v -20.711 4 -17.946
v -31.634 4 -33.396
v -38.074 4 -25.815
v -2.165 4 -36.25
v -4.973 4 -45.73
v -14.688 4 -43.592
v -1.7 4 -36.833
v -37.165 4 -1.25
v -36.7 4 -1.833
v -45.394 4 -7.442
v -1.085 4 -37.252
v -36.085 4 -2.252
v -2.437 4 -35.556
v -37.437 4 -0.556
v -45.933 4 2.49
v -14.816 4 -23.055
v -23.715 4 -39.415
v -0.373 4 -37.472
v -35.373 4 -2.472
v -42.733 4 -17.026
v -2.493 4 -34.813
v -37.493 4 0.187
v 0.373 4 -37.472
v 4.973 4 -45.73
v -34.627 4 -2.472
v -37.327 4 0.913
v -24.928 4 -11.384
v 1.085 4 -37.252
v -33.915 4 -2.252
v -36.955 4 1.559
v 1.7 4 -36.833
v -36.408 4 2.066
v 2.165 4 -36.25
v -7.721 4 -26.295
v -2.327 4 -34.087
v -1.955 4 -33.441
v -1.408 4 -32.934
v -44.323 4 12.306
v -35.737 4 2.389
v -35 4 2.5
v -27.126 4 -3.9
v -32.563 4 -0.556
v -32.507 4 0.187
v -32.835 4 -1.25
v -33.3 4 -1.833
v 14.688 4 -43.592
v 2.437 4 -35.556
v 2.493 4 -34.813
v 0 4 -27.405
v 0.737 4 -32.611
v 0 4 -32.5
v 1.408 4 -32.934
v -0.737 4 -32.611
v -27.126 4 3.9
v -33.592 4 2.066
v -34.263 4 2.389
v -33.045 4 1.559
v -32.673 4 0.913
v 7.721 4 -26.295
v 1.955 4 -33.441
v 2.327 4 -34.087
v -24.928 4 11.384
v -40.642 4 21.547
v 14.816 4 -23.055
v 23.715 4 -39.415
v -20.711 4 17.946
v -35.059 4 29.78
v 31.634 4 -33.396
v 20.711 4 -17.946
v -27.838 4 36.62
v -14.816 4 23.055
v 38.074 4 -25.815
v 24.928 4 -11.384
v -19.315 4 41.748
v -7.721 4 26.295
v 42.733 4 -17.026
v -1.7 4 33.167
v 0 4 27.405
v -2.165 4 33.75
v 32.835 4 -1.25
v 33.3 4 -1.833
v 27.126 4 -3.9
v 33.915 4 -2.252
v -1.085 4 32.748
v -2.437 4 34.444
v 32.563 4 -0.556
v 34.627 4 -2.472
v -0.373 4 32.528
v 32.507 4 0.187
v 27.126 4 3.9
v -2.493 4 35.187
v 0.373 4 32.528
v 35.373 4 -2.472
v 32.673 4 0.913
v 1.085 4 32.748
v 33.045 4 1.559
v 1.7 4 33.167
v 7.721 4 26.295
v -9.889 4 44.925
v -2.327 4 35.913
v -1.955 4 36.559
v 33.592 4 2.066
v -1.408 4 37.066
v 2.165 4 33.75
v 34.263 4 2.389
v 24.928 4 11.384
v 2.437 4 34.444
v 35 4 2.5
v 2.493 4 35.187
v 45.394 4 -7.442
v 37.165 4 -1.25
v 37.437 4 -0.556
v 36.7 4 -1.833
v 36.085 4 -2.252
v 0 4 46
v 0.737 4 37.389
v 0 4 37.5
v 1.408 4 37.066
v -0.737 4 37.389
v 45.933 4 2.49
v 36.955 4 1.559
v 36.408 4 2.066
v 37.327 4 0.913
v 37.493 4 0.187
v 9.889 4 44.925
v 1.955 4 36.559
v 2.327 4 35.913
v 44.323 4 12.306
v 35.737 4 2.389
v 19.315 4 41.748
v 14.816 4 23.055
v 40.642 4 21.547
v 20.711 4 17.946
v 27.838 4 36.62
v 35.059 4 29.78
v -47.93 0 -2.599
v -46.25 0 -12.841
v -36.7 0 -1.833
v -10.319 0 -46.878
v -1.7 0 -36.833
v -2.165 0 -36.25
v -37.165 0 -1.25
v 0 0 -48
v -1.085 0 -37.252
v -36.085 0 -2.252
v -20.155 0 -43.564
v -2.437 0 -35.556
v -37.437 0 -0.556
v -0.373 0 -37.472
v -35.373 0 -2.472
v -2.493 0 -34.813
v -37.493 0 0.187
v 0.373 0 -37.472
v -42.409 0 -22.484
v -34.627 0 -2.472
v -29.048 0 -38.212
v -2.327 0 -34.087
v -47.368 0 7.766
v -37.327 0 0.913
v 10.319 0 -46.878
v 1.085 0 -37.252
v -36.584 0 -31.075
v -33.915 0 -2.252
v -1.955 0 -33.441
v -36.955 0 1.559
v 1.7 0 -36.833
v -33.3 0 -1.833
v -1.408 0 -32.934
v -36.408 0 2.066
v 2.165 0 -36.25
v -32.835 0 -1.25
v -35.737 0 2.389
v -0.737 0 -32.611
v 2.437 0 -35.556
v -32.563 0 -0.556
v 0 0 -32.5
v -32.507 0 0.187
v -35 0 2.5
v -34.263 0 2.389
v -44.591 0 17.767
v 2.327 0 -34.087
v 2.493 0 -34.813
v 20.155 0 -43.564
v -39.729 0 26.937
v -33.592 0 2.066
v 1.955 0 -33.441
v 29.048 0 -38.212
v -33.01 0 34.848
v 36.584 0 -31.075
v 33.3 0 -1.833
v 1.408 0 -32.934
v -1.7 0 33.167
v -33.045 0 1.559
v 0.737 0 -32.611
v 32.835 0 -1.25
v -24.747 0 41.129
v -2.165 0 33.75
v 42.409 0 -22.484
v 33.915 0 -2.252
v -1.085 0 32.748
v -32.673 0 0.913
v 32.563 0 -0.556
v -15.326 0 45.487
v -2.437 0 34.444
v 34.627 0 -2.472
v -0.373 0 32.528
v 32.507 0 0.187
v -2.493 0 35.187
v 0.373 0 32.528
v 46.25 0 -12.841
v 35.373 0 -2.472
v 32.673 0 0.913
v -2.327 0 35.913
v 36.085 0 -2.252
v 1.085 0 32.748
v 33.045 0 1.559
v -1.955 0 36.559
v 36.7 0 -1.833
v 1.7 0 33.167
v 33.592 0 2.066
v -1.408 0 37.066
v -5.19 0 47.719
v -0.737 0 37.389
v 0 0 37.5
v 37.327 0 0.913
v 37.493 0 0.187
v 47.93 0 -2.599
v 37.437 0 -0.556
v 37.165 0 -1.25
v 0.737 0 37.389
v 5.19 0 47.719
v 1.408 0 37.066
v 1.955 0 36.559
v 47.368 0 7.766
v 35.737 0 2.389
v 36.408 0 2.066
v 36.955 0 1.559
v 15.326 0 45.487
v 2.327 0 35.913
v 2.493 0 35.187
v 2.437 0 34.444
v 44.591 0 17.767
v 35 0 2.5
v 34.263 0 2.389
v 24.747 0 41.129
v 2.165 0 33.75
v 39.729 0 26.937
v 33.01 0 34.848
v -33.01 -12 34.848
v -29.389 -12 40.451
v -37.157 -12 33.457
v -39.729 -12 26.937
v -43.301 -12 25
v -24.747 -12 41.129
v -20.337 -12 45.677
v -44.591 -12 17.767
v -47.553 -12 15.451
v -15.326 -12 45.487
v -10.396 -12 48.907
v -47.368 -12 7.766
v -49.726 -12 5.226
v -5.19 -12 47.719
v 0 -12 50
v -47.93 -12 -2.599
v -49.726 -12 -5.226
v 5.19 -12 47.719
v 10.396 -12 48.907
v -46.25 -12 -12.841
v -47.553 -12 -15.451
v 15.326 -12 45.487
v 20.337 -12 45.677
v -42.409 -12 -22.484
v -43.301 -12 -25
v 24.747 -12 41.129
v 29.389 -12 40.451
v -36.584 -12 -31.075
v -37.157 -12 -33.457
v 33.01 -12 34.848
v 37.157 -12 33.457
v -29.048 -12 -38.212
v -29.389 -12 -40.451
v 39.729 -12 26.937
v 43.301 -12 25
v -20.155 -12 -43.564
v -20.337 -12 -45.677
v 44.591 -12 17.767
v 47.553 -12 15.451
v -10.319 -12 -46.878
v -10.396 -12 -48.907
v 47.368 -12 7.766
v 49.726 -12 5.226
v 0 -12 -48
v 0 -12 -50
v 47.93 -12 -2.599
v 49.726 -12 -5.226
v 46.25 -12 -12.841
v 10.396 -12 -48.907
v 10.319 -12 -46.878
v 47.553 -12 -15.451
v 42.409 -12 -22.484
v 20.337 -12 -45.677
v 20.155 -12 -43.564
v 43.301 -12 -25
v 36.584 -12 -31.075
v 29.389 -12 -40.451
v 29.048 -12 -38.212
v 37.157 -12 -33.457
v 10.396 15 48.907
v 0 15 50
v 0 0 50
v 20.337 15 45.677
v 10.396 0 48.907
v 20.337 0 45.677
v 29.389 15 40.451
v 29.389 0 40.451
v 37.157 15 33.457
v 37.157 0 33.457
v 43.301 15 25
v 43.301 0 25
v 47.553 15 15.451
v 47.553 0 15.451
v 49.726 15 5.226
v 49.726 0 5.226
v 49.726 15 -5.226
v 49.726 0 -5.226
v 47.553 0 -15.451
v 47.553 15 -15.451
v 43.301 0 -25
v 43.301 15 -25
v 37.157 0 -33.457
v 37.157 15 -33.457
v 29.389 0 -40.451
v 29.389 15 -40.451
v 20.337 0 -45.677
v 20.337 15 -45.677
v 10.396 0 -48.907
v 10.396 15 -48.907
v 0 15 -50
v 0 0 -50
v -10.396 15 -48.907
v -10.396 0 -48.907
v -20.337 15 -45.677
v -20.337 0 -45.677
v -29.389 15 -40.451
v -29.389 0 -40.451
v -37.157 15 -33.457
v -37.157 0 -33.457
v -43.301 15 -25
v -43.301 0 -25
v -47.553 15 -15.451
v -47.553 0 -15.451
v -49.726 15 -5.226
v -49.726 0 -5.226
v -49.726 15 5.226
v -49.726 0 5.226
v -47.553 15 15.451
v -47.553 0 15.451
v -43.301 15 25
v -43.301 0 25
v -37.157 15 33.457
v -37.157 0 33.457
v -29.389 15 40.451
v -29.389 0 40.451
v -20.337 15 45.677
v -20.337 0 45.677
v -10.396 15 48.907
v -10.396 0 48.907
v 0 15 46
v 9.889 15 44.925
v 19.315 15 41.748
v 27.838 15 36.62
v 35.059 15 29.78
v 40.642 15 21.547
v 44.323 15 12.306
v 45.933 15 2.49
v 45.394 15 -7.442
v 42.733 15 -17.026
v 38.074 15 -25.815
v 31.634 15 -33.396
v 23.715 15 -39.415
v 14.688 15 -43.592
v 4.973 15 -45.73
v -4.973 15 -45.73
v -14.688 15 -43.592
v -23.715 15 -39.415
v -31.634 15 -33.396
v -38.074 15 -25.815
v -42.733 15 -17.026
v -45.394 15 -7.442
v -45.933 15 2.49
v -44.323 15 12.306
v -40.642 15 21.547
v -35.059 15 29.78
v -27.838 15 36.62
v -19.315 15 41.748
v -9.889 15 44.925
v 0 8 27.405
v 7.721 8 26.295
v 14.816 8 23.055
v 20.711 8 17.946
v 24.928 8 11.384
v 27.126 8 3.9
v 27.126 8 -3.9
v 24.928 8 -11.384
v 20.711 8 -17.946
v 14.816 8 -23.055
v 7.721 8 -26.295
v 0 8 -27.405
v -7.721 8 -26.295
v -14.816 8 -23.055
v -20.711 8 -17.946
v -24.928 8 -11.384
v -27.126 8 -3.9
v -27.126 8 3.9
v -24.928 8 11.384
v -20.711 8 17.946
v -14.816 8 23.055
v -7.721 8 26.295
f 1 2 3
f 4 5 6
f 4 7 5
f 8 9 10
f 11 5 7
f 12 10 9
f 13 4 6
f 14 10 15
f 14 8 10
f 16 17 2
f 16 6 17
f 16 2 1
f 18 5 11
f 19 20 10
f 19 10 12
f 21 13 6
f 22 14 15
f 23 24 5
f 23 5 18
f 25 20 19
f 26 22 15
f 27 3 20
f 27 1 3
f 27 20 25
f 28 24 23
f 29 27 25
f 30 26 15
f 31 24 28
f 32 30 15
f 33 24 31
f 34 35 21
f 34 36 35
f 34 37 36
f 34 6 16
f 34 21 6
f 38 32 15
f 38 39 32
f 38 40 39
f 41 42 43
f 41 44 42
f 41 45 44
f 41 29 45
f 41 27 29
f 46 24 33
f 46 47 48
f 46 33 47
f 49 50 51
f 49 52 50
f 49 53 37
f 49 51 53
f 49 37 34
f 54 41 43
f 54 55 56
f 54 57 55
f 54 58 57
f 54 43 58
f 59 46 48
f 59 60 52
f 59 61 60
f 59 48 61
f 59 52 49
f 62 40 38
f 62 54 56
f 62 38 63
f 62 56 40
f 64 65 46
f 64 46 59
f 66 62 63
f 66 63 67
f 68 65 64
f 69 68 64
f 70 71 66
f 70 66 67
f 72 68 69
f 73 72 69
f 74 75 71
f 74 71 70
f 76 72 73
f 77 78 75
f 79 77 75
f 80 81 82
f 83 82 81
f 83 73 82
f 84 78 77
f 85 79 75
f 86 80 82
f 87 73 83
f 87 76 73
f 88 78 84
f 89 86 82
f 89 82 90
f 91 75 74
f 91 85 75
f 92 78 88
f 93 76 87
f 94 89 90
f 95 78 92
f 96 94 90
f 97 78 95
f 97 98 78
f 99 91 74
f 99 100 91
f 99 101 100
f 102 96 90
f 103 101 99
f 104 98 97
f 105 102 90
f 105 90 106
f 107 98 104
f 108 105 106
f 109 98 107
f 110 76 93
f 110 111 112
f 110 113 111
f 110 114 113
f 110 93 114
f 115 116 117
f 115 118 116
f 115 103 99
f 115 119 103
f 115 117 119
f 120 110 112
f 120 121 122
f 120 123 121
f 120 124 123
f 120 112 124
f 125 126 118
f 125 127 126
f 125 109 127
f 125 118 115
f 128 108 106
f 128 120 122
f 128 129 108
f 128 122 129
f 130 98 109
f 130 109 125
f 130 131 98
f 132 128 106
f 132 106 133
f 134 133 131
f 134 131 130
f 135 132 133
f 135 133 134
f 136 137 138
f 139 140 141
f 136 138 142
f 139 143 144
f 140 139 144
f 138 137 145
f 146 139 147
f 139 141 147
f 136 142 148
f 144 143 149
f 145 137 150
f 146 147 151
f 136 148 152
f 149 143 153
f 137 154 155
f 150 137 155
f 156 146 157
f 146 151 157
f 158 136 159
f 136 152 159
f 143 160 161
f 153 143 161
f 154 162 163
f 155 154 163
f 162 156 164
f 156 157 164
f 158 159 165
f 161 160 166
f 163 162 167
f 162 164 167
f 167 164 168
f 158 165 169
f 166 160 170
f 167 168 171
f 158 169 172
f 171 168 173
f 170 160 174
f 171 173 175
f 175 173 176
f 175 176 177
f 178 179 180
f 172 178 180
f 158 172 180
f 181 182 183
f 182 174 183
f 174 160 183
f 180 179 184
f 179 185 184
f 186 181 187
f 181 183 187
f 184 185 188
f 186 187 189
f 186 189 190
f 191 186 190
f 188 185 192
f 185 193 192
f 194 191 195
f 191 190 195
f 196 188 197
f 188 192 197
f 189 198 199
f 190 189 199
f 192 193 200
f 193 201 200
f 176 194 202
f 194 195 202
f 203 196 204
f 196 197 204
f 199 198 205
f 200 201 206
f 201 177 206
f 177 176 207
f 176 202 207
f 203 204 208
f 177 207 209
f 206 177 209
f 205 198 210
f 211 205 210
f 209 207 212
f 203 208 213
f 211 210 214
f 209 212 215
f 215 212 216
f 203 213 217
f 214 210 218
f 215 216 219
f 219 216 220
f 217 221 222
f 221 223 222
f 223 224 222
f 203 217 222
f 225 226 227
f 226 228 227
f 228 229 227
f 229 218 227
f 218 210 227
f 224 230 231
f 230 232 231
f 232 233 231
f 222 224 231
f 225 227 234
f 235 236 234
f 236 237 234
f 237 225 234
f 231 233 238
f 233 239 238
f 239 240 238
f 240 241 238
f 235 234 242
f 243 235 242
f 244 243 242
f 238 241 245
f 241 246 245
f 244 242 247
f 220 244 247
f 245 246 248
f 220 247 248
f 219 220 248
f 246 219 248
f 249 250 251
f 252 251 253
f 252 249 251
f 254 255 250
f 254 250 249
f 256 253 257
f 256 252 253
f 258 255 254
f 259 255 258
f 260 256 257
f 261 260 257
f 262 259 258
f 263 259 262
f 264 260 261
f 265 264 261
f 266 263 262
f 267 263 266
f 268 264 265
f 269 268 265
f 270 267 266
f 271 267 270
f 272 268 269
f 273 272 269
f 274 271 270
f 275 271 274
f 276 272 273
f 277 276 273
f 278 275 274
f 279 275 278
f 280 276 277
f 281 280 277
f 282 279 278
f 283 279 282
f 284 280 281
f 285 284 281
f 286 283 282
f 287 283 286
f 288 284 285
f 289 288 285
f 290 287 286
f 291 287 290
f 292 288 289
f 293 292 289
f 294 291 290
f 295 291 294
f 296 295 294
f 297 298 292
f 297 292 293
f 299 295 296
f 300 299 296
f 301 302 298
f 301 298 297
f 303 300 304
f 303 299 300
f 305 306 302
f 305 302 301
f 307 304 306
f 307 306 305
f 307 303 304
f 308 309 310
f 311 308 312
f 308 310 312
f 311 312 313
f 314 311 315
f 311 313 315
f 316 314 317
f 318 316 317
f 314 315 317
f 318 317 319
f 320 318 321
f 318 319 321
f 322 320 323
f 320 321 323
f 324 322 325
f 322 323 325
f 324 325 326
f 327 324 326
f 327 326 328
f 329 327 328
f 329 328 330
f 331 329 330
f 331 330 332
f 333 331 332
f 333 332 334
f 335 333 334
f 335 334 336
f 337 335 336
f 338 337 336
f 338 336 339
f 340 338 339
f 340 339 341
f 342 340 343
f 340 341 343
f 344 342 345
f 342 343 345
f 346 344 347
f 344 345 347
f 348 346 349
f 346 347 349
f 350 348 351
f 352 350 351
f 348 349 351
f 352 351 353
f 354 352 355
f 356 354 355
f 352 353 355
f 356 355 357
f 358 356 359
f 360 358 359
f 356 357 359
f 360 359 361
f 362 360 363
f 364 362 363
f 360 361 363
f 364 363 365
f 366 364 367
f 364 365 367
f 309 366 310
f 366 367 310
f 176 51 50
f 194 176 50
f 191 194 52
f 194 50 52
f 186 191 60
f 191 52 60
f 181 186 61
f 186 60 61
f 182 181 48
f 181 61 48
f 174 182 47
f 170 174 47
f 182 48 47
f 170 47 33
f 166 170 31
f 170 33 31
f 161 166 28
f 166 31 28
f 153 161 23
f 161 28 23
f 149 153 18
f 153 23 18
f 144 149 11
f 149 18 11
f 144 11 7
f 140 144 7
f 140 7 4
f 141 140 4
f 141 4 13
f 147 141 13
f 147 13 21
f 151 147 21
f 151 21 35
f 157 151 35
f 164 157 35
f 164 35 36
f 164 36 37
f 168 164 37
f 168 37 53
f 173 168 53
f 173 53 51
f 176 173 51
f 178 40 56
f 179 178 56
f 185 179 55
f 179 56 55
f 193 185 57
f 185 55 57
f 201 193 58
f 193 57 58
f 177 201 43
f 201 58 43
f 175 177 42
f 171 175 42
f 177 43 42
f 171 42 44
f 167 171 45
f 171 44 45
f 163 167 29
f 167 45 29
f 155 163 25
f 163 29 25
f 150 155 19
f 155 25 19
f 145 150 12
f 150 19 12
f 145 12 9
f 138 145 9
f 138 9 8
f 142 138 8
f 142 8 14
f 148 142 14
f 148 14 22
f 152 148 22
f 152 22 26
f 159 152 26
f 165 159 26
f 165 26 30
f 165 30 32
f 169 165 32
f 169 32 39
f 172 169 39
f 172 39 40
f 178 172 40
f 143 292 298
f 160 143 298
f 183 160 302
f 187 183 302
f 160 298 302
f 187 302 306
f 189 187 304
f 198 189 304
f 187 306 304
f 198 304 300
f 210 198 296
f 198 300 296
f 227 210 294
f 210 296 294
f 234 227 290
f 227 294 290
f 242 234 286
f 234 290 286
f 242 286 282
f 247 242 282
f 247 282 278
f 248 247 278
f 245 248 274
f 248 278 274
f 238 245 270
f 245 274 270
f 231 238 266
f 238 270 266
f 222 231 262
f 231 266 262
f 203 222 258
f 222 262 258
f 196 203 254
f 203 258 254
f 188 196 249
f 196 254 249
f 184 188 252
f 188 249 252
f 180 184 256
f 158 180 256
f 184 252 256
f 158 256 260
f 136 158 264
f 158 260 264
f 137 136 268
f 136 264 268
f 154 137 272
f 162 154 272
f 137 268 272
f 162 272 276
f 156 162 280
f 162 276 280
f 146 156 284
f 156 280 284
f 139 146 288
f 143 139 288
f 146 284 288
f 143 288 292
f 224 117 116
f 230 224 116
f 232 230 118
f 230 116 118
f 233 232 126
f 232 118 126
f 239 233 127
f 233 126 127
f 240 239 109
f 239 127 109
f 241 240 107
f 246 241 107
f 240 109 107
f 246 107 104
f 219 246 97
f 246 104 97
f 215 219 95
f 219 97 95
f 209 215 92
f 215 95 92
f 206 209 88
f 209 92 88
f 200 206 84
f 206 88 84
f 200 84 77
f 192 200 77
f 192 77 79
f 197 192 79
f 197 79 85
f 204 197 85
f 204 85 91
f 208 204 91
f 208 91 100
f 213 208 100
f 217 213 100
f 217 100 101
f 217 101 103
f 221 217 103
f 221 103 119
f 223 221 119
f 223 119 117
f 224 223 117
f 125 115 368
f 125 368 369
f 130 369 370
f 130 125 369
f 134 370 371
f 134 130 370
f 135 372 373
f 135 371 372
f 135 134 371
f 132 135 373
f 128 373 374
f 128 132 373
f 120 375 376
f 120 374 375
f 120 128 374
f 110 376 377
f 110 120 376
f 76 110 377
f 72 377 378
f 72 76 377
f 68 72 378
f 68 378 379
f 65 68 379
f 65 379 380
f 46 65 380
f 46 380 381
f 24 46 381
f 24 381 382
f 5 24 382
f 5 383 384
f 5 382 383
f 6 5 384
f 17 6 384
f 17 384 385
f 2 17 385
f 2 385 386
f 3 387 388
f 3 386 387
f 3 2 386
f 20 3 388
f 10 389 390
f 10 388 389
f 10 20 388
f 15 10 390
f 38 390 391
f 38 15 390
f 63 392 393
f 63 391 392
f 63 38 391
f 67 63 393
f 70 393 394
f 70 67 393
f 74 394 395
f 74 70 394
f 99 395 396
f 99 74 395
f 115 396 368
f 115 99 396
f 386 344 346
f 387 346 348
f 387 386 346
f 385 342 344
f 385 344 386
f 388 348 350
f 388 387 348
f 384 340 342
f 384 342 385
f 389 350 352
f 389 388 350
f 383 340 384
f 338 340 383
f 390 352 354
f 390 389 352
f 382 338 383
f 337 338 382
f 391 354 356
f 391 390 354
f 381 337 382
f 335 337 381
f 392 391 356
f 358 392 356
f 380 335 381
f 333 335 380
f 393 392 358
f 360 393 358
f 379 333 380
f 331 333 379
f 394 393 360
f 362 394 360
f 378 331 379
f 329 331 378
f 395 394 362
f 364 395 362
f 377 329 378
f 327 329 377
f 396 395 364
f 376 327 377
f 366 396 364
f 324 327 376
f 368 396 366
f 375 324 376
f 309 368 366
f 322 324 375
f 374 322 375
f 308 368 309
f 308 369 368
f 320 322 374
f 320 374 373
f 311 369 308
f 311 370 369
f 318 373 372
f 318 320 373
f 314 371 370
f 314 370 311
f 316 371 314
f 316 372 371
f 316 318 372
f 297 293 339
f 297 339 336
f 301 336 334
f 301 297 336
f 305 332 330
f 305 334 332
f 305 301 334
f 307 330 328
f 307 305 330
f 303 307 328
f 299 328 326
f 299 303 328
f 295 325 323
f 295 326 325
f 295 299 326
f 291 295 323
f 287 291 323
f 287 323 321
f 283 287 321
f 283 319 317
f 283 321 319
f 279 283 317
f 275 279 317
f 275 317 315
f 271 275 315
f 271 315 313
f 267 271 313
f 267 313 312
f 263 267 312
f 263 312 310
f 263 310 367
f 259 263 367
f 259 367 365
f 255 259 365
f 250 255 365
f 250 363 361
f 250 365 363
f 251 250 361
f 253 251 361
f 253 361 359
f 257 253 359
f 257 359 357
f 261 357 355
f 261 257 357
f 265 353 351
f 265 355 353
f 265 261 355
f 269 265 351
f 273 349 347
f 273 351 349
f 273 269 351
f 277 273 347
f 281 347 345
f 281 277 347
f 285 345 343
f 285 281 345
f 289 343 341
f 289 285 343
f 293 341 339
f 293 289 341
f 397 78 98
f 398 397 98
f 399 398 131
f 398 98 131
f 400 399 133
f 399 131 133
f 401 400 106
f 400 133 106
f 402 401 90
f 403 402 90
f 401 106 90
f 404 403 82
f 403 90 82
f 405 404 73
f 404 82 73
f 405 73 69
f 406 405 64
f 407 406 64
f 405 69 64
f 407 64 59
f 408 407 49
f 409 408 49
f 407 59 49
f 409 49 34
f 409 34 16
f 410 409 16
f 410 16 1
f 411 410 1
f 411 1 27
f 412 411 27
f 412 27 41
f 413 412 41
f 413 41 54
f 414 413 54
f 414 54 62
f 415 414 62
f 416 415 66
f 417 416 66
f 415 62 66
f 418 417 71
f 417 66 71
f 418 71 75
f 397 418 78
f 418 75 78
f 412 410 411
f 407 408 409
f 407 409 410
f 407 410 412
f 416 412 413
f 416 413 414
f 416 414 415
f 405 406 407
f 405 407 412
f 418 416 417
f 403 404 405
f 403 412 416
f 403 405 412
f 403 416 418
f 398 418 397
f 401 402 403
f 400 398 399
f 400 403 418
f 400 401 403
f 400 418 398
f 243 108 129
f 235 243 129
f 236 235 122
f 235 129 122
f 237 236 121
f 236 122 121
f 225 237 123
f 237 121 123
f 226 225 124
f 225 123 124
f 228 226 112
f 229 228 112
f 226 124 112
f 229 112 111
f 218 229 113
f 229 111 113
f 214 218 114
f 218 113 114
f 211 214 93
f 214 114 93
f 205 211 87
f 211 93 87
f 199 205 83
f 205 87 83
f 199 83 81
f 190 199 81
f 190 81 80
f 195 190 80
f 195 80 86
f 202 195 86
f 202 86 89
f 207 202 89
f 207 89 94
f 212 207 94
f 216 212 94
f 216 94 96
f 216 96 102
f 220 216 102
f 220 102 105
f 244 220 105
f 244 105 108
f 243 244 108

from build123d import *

# Parameters (mm, degrees)
SKETCH1_R           = 50
BOSS_EXTRUDE2_DEPTH = 15
SHELL1_T            = -4
SKETCH3_R           = 27.405
BOSS_EXTRUDE3_DEPTH = 4
SKETCH7_R           = 2.5
CUT_EXTRUDE1_DEPTH  = 12
BOSS_EXTRUDE5_START = 12
SKETCH8_R           = 50
SKETCH8_R_2         = 48
BOSS_EXTRUDE5_DEPTH = 12


with BuildPart() as part:
    # Sketch1 → Boss-Extrude2 (new body)
    with BuildSketch(Plane(origin=(0, 0, 0), x_dir=(1, 0, 0), z_dir=(0, 1, 0))):
        with Locations(Location((0, 0, 0), (0, 0, 270))):
            Circle(SKETCH1_R)
    extrude(amount=BOSS_EXTRUDE2_DEPTH)

    # Shell1
    shell1_openings = [part.faces().sort_by_distance(p)[0] for p in [
        (0, 15, 0),
    ]]
    offset(amount=SHELL1_T, openings=shell1_openings, kind=Kind.INTERSECTION)

    # Sketch3 → Boss-Extrude3 (add)
    with BuildSketch(Plane(origin=(0, 4, 0), x_dir=(1, 0, 0), z_dir=(0, 1, 0))):
        with Locations(Location((0, 0, 0), (0, 0, 270))):
            Circle(SKETCH3_R)
    extrude(amount=BOSS_EXTRUDE3_DEPTH)

    # Sketch7 → Cut-Extrude1 (cut)
    with BuildSketch(Plane(origin=(0, 8, 0), x_dir=(1, 0, 0), z_dir=(0, 1, 0))):
        with Locations(Location((35, 0, 0), (0, 0, 270))):
            Circle(SKETCH7_R)
        with Locations(Location((0, 35, 0), (0, 0, 270))):
            Circle(SKETCH7_R)
        with Locations(Location((-35, 0, 0), (0, 0, 270))):
            Circle(SKETCH7_R)
        with Locations(Location((0, -35, 0), (0, 0, 270))):
            Circle(SKETCH7_R)
    extrude(amount=-CUT_EXTRUDE1_DEPTH, mode=Mode.SUBTRACT)

    # Sketch8 → Boss-Extrude5 (add)
    with BuildSketch(Plane(origin=(0, 0, 0), x_dir=(-1, 0, 0), z_dir=(0, -1, 0)).offset(BOSS_EXTRUDE5_START)):
        with Locations(Location((0, 0, 0), (0, 0, 90))):
            Circle(SKETCH8_R)
        with Locations(Location((0, 0, 0), (0, 0, 90))):
            Circle(SKETCH8_R_2, mode=Mode.SUBTRACT)
    extrude(amount=-BOSS_EXTRUDE5_DEPTH)


solid = part.part
